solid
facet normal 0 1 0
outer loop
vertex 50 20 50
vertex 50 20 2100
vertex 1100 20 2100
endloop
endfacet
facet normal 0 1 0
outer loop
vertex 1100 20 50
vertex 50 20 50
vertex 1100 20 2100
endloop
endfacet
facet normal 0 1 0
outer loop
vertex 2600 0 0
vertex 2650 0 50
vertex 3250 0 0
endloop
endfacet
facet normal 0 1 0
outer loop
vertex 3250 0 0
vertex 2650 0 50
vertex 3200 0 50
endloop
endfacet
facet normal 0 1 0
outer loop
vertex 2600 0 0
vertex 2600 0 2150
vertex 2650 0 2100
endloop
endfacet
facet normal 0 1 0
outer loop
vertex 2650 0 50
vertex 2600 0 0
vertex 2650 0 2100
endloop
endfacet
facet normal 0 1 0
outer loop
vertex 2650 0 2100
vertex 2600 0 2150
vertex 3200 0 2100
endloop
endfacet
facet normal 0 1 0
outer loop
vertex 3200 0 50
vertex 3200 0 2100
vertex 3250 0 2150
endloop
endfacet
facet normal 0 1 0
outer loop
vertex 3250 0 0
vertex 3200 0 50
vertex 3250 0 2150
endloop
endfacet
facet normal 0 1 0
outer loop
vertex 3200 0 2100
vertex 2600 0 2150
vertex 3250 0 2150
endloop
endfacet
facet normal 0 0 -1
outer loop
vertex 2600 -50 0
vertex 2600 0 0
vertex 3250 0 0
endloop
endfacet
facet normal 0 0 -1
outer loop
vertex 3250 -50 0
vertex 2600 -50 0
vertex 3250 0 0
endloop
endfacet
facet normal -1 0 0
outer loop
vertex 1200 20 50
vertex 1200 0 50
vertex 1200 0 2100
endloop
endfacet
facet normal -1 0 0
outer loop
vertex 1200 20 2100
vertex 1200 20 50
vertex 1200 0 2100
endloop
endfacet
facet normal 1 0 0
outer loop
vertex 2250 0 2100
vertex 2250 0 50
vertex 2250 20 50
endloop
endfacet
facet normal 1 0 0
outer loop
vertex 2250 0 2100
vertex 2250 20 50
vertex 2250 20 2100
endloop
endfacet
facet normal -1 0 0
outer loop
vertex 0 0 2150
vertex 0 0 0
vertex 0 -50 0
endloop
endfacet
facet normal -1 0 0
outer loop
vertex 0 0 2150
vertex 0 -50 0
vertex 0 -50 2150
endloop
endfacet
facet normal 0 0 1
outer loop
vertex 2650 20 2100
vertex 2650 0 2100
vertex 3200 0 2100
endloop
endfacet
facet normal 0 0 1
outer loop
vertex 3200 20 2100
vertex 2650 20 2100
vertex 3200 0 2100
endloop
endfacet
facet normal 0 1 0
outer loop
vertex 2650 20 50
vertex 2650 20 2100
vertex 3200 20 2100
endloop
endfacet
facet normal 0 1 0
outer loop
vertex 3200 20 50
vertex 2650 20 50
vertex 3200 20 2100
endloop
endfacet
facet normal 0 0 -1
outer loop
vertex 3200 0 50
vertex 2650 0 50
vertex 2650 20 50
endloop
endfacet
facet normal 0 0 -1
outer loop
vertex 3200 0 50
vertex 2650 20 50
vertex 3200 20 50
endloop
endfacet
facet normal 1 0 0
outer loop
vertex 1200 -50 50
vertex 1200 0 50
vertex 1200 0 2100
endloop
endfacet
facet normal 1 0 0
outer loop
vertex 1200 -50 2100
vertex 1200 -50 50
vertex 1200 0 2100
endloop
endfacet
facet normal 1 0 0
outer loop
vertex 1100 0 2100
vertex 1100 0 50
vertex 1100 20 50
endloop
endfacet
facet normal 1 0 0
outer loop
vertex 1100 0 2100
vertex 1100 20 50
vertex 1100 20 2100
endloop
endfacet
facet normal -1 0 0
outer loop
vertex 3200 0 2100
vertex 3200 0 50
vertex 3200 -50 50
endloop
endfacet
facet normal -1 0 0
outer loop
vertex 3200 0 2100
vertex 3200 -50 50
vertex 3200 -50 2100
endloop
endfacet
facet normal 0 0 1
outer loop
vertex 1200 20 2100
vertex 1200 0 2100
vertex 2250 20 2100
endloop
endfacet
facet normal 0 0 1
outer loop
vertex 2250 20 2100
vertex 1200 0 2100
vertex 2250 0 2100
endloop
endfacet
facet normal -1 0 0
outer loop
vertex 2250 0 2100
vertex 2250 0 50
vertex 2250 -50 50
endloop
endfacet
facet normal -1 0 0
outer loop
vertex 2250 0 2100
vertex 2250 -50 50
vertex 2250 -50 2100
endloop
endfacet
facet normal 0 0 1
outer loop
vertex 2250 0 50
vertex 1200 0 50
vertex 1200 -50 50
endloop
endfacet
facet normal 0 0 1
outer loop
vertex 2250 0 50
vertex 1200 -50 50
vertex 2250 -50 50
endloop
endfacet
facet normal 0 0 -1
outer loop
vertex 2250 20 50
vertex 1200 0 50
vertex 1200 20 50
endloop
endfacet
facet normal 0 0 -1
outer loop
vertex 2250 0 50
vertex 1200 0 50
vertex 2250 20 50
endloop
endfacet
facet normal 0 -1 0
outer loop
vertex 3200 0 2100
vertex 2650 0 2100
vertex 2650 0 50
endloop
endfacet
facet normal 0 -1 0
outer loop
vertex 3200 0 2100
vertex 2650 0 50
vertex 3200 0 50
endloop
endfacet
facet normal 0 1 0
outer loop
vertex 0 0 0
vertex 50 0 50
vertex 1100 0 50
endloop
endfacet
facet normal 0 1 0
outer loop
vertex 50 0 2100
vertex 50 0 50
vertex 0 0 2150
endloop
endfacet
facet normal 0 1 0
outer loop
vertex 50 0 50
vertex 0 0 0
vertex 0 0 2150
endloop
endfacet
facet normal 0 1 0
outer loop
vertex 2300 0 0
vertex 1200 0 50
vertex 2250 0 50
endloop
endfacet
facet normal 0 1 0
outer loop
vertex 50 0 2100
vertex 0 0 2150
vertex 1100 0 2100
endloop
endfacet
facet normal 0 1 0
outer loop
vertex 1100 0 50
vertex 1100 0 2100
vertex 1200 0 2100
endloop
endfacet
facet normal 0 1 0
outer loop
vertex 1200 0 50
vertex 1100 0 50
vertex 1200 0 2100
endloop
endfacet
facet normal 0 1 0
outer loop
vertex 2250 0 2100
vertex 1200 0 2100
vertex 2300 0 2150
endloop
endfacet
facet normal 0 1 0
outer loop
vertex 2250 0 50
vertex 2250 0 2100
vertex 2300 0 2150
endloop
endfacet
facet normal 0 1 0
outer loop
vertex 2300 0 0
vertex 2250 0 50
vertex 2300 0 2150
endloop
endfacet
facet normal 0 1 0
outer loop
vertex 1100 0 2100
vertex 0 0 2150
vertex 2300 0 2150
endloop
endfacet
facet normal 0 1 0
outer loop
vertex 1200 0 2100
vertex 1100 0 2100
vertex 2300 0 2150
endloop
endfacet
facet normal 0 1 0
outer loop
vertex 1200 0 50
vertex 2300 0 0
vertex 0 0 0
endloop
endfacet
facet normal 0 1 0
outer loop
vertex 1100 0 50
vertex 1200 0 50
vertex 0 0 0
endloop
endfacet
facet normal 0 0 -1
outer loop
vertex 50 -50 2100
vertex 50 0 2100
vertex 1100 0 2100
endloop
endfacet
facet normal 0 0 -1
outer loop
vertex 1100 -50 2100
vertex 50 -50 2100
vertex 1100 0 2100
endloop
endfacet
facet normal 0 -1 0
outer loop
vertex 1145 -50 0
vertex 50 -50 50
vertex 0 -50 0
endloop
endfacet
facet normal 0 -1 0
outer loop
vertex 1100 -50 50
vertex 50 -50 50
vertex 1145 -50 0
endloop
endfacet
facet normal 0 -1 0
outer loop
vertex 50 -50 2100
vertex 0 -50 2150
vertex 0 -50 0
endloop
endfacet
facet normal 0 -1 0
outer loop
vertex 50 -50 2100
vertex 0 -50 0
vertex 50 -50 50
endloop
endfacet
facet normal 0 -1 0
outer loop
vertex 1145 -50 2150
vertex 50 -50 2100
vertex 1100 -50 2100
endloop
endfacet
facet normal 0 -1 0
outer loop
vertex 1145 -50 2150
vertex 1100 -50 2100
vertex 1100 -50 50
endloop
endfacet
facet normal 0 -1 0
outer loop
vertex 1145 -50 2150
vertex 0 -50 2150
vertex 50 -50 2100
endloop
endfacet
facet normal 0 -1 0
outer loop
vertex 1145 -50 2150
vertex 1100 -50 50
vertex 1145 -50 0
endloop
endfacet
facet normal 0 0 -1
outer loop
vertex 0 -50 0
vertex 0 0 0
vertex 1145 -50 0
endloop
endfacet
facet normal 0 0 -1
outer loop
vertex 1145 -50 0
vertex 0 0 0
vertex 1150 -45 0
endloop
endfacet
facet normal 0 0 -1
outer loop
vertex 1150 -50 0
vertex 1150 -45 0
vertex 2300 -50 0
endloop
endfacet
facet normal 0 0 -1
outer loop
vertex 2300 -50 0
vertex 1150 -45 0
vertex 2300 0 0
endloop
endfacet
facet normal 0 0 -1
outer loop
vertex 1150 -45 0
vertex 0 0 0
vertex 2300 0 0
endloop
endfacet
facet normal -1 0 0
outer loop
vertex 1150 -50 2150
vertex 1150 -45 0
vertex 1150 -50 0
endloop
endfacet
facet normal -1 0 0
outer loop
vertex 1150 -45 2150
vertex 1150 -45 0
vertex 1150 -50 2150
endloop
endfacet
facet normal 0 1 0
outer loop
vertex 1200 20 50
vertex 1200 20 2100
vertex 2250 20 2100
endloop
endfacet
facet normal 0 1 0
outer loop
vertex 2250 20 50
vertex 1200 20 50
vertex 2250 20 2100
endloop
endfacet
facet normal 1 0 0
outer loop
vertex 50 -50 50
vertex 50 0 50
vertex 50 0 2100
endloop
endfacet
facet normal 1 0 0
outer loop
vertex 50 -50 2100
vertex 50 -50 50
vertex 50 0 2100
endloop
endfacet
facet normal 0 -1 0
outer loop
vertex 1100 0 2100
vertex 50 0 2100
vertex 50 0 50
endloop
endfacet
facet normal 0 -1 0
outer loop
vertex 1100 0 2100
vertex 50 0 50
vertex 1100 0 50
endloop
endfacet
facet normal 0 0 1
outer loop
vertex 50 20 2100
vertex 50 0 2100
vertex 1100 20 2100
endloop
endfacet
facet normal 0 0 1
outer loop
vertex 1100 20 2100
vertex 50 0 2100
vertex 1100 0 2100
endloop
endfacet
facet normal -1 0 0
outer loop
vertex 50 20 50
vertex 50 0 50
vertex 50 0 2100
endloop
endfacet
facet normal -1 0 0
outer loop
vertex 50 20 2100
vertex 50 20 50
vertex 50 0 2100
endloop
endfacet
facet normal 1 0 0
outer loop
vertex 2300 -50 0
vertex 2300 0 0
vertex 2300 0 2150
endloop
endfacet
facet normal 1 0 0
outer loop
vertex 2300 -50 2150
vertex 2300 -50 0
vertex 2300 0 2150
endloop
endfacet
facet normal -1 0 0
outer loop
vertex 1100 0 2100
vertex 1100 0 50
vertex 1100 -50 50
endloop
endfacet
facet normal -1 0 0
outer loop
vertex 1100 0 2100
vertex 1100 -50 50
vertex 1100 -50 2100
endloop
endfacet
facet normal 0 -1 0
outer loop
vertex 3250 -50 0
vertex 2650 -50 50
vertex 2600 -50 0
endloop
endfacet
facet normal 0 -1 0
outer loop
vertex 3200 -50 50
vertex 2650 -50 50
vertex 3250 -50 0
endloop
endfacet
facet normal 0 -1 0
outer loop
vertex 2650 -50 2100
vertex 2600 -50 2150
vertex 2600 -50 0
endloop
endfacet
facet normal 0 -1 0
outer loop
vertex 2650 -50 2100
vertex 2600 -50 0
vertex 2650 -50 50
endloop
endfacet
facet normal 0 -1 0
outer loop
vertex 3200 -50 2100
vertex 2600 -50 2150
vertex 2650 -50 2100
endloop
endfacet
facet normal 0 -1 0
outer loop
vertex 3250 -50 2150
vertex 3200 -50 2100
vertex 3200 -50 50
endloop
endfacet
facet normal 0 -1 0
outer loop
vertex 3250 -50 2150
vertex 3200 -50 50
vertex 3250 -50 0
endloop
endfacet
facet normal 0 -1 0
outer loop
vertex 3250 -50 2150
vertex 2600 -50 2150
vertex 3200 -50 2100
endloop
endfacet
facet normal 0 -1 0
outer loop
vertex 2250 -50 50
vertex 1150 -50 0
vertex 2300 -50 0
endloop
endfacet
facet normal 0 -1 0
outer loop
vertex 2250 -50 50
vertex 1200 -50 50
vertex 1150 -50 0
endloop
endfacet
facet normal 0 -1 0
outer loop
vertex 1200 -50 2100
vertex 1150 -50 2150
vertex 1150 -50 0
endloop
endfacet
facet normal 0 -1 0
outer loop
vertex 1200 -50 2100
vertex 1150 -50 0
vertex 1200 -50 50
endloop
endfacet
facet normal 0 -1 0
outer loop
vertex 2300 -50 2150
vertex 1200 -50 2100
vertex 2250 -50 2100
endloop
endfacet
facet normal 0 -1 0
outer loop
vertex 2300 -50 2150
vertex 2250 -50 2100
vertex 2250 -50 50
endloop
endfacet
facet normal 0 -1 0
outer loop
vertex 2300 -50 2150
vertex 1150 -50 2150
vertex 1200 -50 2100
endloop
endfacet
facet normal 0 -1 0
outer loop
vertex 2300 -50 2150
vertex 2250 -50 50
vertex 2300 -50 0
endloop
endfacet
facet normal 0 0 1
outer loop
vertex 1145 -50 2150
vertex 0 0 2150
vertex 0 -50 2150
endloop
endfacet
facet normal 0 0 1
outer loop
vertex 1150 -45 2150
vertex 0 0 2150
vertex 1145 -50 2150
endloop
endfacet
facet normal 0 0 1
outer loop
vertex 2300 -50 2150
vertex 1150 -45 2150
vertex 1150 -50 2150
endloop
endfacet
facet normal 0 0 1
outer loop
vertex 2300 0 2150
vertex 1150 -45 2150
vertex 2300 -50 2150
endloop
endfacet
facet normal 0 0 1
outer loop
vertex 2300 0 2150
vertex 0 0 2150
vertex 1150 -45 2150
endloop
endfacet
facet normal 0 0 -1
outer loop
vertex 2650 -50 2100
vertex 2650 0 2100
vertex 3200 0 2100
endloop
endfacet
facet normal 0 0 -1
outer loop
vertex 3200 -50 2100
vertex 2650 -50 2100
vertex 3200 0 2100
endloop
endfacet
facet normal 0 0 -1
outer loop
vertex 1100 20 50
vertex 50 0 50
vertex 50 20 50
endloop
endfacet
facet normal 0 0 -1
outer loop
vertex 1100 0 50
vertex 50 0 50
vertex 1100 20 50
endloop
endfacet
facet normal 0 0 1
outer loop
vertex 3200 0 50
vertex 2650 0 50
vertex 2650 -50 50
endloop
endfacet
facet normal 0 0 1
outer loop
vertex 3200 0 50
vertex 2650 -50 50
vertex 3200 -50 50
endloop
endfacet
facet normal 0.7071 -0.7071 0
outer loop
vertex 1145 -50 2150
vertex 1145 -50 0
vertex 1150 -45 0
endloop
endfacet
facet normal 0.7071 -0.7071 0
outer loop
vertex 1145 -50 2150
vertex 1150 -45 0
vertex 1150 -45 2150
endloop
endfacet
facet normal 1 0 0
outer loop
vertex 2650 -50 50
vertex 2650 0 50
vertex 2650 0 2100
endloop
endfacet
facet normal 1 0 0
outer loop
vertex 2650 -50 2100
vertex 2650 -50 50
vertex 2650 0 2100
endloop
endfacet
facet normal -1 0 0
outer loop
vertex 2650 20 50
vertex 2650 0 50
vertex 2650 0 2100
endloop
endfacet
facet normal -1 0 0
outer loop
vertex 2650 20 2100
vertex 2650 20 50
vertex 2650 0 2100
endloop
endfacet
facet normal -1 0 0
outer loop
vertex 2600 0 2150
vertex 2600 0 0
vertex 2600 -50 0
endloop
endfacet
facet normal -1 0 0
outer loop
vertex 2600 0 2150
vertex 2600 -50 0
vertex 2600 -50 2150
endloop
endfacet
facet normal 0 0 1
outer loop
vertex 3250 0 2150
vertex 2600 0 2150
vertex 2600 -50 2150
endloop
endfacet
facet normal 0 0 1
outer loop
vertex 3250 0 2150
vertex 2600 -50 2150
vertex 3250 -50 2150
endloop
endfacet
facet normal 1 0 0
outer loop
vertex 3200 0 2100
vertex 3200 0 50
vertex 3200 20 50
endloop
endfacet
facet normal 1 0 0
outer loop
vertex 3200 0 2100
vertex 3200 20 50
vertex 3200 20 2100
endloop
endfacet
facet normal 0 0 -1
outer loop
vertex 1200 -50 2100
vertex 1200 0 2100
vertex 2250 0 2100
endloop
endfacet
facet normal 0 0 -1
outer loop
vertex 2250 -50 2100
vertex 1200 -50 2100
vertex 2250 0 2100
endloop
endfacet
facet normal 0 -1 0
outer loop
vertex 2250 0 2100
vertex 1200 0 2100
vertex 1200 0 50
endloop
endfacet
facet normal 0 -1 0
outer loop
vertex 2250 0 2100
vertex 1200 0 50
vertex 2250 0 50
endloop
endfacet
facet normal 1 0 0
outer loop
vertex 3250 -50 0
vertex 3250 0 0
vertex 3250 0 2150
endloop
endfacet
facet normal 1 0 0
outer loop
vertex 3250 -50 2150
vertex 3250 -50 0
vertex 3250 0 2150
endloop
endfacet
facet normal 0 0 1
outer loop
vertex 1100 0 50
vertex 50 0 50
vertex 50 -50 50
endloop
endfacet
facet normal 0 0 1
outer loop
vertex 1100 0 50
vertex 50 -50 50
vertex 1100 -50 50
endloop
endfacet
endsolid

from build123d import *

# Parameters (mm, degrees)
F0_W     = 1150
F0_H     = 2150
F0_W_2   = 1050
F0_H_2   = 2050
F1_DEPTH = 50
F2_SIZE  = 5
F3_DEPTH = 50
F0_W_3   = 650
F0_W_4   = 550
F4_DEPTH = 50
F5_DEPTH = 20


with BuildPart() as f1:
    # F0 (on Front) → F1 (new body)
    with BuildSketch(Plane.XZ):
        with Locations((575, 1075)):
            Rectangle(F0_W, F0_H)
        with Locations((575, 1075)):
            Rectangle(F0_W_2, F0_H_2, mode=Mode.SUBTRACT)
    extrude(amount=F1_DEPTH)

    # F2
    f2_edges = [f1.edges().sort_by_distance(p)[0] for p in [
        (1150, -50, 1075),
    ]]
    chamfer(f2_edges, length=F2_SIZE)

    # F0 (on Front) → F3 (join)
    with BuildSketch(Plane.XZ):
        with Locations((1725, 1075)):
            Rectangle(F0_W, F0_H)
        with Locations((1725, 1075)):
            Rectangle(F0_W_2, F0_H_2, mode=Mode.SUBTRACT)
    extrude(amount=F3_DEPTH)


with BuildPart() as f4:
    # F0 (on Front) → F4 (new body)
    with BuildSketch(Plane.XZ):
        with Locations((2925, 1075)):
            Rectangle(F0_W_3, F0_H)
        with Locations((2925, 1075)):
            Rectangle(F0_W_4, F0_H_2, mode=Mode.SUBTRACT)
    extrude(amount=F4_DEPTH)


with BuildPart() as f5:
    # F0 (on Front) → F5 (new body)
    with BuildSketch(Plane.XZ):
        with Locations((575, 1075)):
            Rectangle(F0_W_2, F0_H_2)
        with Locations((1725, 1075)):
            Rectangle(F0_W_2, F0_H_2)
        with Locations((2925, 1075)):
            Rectangle(F0_W_4, F0_H_2)
    extrude(amount=-F5_DEPTH)


solid = Compound([f1.part, f4.part, f5.part])
